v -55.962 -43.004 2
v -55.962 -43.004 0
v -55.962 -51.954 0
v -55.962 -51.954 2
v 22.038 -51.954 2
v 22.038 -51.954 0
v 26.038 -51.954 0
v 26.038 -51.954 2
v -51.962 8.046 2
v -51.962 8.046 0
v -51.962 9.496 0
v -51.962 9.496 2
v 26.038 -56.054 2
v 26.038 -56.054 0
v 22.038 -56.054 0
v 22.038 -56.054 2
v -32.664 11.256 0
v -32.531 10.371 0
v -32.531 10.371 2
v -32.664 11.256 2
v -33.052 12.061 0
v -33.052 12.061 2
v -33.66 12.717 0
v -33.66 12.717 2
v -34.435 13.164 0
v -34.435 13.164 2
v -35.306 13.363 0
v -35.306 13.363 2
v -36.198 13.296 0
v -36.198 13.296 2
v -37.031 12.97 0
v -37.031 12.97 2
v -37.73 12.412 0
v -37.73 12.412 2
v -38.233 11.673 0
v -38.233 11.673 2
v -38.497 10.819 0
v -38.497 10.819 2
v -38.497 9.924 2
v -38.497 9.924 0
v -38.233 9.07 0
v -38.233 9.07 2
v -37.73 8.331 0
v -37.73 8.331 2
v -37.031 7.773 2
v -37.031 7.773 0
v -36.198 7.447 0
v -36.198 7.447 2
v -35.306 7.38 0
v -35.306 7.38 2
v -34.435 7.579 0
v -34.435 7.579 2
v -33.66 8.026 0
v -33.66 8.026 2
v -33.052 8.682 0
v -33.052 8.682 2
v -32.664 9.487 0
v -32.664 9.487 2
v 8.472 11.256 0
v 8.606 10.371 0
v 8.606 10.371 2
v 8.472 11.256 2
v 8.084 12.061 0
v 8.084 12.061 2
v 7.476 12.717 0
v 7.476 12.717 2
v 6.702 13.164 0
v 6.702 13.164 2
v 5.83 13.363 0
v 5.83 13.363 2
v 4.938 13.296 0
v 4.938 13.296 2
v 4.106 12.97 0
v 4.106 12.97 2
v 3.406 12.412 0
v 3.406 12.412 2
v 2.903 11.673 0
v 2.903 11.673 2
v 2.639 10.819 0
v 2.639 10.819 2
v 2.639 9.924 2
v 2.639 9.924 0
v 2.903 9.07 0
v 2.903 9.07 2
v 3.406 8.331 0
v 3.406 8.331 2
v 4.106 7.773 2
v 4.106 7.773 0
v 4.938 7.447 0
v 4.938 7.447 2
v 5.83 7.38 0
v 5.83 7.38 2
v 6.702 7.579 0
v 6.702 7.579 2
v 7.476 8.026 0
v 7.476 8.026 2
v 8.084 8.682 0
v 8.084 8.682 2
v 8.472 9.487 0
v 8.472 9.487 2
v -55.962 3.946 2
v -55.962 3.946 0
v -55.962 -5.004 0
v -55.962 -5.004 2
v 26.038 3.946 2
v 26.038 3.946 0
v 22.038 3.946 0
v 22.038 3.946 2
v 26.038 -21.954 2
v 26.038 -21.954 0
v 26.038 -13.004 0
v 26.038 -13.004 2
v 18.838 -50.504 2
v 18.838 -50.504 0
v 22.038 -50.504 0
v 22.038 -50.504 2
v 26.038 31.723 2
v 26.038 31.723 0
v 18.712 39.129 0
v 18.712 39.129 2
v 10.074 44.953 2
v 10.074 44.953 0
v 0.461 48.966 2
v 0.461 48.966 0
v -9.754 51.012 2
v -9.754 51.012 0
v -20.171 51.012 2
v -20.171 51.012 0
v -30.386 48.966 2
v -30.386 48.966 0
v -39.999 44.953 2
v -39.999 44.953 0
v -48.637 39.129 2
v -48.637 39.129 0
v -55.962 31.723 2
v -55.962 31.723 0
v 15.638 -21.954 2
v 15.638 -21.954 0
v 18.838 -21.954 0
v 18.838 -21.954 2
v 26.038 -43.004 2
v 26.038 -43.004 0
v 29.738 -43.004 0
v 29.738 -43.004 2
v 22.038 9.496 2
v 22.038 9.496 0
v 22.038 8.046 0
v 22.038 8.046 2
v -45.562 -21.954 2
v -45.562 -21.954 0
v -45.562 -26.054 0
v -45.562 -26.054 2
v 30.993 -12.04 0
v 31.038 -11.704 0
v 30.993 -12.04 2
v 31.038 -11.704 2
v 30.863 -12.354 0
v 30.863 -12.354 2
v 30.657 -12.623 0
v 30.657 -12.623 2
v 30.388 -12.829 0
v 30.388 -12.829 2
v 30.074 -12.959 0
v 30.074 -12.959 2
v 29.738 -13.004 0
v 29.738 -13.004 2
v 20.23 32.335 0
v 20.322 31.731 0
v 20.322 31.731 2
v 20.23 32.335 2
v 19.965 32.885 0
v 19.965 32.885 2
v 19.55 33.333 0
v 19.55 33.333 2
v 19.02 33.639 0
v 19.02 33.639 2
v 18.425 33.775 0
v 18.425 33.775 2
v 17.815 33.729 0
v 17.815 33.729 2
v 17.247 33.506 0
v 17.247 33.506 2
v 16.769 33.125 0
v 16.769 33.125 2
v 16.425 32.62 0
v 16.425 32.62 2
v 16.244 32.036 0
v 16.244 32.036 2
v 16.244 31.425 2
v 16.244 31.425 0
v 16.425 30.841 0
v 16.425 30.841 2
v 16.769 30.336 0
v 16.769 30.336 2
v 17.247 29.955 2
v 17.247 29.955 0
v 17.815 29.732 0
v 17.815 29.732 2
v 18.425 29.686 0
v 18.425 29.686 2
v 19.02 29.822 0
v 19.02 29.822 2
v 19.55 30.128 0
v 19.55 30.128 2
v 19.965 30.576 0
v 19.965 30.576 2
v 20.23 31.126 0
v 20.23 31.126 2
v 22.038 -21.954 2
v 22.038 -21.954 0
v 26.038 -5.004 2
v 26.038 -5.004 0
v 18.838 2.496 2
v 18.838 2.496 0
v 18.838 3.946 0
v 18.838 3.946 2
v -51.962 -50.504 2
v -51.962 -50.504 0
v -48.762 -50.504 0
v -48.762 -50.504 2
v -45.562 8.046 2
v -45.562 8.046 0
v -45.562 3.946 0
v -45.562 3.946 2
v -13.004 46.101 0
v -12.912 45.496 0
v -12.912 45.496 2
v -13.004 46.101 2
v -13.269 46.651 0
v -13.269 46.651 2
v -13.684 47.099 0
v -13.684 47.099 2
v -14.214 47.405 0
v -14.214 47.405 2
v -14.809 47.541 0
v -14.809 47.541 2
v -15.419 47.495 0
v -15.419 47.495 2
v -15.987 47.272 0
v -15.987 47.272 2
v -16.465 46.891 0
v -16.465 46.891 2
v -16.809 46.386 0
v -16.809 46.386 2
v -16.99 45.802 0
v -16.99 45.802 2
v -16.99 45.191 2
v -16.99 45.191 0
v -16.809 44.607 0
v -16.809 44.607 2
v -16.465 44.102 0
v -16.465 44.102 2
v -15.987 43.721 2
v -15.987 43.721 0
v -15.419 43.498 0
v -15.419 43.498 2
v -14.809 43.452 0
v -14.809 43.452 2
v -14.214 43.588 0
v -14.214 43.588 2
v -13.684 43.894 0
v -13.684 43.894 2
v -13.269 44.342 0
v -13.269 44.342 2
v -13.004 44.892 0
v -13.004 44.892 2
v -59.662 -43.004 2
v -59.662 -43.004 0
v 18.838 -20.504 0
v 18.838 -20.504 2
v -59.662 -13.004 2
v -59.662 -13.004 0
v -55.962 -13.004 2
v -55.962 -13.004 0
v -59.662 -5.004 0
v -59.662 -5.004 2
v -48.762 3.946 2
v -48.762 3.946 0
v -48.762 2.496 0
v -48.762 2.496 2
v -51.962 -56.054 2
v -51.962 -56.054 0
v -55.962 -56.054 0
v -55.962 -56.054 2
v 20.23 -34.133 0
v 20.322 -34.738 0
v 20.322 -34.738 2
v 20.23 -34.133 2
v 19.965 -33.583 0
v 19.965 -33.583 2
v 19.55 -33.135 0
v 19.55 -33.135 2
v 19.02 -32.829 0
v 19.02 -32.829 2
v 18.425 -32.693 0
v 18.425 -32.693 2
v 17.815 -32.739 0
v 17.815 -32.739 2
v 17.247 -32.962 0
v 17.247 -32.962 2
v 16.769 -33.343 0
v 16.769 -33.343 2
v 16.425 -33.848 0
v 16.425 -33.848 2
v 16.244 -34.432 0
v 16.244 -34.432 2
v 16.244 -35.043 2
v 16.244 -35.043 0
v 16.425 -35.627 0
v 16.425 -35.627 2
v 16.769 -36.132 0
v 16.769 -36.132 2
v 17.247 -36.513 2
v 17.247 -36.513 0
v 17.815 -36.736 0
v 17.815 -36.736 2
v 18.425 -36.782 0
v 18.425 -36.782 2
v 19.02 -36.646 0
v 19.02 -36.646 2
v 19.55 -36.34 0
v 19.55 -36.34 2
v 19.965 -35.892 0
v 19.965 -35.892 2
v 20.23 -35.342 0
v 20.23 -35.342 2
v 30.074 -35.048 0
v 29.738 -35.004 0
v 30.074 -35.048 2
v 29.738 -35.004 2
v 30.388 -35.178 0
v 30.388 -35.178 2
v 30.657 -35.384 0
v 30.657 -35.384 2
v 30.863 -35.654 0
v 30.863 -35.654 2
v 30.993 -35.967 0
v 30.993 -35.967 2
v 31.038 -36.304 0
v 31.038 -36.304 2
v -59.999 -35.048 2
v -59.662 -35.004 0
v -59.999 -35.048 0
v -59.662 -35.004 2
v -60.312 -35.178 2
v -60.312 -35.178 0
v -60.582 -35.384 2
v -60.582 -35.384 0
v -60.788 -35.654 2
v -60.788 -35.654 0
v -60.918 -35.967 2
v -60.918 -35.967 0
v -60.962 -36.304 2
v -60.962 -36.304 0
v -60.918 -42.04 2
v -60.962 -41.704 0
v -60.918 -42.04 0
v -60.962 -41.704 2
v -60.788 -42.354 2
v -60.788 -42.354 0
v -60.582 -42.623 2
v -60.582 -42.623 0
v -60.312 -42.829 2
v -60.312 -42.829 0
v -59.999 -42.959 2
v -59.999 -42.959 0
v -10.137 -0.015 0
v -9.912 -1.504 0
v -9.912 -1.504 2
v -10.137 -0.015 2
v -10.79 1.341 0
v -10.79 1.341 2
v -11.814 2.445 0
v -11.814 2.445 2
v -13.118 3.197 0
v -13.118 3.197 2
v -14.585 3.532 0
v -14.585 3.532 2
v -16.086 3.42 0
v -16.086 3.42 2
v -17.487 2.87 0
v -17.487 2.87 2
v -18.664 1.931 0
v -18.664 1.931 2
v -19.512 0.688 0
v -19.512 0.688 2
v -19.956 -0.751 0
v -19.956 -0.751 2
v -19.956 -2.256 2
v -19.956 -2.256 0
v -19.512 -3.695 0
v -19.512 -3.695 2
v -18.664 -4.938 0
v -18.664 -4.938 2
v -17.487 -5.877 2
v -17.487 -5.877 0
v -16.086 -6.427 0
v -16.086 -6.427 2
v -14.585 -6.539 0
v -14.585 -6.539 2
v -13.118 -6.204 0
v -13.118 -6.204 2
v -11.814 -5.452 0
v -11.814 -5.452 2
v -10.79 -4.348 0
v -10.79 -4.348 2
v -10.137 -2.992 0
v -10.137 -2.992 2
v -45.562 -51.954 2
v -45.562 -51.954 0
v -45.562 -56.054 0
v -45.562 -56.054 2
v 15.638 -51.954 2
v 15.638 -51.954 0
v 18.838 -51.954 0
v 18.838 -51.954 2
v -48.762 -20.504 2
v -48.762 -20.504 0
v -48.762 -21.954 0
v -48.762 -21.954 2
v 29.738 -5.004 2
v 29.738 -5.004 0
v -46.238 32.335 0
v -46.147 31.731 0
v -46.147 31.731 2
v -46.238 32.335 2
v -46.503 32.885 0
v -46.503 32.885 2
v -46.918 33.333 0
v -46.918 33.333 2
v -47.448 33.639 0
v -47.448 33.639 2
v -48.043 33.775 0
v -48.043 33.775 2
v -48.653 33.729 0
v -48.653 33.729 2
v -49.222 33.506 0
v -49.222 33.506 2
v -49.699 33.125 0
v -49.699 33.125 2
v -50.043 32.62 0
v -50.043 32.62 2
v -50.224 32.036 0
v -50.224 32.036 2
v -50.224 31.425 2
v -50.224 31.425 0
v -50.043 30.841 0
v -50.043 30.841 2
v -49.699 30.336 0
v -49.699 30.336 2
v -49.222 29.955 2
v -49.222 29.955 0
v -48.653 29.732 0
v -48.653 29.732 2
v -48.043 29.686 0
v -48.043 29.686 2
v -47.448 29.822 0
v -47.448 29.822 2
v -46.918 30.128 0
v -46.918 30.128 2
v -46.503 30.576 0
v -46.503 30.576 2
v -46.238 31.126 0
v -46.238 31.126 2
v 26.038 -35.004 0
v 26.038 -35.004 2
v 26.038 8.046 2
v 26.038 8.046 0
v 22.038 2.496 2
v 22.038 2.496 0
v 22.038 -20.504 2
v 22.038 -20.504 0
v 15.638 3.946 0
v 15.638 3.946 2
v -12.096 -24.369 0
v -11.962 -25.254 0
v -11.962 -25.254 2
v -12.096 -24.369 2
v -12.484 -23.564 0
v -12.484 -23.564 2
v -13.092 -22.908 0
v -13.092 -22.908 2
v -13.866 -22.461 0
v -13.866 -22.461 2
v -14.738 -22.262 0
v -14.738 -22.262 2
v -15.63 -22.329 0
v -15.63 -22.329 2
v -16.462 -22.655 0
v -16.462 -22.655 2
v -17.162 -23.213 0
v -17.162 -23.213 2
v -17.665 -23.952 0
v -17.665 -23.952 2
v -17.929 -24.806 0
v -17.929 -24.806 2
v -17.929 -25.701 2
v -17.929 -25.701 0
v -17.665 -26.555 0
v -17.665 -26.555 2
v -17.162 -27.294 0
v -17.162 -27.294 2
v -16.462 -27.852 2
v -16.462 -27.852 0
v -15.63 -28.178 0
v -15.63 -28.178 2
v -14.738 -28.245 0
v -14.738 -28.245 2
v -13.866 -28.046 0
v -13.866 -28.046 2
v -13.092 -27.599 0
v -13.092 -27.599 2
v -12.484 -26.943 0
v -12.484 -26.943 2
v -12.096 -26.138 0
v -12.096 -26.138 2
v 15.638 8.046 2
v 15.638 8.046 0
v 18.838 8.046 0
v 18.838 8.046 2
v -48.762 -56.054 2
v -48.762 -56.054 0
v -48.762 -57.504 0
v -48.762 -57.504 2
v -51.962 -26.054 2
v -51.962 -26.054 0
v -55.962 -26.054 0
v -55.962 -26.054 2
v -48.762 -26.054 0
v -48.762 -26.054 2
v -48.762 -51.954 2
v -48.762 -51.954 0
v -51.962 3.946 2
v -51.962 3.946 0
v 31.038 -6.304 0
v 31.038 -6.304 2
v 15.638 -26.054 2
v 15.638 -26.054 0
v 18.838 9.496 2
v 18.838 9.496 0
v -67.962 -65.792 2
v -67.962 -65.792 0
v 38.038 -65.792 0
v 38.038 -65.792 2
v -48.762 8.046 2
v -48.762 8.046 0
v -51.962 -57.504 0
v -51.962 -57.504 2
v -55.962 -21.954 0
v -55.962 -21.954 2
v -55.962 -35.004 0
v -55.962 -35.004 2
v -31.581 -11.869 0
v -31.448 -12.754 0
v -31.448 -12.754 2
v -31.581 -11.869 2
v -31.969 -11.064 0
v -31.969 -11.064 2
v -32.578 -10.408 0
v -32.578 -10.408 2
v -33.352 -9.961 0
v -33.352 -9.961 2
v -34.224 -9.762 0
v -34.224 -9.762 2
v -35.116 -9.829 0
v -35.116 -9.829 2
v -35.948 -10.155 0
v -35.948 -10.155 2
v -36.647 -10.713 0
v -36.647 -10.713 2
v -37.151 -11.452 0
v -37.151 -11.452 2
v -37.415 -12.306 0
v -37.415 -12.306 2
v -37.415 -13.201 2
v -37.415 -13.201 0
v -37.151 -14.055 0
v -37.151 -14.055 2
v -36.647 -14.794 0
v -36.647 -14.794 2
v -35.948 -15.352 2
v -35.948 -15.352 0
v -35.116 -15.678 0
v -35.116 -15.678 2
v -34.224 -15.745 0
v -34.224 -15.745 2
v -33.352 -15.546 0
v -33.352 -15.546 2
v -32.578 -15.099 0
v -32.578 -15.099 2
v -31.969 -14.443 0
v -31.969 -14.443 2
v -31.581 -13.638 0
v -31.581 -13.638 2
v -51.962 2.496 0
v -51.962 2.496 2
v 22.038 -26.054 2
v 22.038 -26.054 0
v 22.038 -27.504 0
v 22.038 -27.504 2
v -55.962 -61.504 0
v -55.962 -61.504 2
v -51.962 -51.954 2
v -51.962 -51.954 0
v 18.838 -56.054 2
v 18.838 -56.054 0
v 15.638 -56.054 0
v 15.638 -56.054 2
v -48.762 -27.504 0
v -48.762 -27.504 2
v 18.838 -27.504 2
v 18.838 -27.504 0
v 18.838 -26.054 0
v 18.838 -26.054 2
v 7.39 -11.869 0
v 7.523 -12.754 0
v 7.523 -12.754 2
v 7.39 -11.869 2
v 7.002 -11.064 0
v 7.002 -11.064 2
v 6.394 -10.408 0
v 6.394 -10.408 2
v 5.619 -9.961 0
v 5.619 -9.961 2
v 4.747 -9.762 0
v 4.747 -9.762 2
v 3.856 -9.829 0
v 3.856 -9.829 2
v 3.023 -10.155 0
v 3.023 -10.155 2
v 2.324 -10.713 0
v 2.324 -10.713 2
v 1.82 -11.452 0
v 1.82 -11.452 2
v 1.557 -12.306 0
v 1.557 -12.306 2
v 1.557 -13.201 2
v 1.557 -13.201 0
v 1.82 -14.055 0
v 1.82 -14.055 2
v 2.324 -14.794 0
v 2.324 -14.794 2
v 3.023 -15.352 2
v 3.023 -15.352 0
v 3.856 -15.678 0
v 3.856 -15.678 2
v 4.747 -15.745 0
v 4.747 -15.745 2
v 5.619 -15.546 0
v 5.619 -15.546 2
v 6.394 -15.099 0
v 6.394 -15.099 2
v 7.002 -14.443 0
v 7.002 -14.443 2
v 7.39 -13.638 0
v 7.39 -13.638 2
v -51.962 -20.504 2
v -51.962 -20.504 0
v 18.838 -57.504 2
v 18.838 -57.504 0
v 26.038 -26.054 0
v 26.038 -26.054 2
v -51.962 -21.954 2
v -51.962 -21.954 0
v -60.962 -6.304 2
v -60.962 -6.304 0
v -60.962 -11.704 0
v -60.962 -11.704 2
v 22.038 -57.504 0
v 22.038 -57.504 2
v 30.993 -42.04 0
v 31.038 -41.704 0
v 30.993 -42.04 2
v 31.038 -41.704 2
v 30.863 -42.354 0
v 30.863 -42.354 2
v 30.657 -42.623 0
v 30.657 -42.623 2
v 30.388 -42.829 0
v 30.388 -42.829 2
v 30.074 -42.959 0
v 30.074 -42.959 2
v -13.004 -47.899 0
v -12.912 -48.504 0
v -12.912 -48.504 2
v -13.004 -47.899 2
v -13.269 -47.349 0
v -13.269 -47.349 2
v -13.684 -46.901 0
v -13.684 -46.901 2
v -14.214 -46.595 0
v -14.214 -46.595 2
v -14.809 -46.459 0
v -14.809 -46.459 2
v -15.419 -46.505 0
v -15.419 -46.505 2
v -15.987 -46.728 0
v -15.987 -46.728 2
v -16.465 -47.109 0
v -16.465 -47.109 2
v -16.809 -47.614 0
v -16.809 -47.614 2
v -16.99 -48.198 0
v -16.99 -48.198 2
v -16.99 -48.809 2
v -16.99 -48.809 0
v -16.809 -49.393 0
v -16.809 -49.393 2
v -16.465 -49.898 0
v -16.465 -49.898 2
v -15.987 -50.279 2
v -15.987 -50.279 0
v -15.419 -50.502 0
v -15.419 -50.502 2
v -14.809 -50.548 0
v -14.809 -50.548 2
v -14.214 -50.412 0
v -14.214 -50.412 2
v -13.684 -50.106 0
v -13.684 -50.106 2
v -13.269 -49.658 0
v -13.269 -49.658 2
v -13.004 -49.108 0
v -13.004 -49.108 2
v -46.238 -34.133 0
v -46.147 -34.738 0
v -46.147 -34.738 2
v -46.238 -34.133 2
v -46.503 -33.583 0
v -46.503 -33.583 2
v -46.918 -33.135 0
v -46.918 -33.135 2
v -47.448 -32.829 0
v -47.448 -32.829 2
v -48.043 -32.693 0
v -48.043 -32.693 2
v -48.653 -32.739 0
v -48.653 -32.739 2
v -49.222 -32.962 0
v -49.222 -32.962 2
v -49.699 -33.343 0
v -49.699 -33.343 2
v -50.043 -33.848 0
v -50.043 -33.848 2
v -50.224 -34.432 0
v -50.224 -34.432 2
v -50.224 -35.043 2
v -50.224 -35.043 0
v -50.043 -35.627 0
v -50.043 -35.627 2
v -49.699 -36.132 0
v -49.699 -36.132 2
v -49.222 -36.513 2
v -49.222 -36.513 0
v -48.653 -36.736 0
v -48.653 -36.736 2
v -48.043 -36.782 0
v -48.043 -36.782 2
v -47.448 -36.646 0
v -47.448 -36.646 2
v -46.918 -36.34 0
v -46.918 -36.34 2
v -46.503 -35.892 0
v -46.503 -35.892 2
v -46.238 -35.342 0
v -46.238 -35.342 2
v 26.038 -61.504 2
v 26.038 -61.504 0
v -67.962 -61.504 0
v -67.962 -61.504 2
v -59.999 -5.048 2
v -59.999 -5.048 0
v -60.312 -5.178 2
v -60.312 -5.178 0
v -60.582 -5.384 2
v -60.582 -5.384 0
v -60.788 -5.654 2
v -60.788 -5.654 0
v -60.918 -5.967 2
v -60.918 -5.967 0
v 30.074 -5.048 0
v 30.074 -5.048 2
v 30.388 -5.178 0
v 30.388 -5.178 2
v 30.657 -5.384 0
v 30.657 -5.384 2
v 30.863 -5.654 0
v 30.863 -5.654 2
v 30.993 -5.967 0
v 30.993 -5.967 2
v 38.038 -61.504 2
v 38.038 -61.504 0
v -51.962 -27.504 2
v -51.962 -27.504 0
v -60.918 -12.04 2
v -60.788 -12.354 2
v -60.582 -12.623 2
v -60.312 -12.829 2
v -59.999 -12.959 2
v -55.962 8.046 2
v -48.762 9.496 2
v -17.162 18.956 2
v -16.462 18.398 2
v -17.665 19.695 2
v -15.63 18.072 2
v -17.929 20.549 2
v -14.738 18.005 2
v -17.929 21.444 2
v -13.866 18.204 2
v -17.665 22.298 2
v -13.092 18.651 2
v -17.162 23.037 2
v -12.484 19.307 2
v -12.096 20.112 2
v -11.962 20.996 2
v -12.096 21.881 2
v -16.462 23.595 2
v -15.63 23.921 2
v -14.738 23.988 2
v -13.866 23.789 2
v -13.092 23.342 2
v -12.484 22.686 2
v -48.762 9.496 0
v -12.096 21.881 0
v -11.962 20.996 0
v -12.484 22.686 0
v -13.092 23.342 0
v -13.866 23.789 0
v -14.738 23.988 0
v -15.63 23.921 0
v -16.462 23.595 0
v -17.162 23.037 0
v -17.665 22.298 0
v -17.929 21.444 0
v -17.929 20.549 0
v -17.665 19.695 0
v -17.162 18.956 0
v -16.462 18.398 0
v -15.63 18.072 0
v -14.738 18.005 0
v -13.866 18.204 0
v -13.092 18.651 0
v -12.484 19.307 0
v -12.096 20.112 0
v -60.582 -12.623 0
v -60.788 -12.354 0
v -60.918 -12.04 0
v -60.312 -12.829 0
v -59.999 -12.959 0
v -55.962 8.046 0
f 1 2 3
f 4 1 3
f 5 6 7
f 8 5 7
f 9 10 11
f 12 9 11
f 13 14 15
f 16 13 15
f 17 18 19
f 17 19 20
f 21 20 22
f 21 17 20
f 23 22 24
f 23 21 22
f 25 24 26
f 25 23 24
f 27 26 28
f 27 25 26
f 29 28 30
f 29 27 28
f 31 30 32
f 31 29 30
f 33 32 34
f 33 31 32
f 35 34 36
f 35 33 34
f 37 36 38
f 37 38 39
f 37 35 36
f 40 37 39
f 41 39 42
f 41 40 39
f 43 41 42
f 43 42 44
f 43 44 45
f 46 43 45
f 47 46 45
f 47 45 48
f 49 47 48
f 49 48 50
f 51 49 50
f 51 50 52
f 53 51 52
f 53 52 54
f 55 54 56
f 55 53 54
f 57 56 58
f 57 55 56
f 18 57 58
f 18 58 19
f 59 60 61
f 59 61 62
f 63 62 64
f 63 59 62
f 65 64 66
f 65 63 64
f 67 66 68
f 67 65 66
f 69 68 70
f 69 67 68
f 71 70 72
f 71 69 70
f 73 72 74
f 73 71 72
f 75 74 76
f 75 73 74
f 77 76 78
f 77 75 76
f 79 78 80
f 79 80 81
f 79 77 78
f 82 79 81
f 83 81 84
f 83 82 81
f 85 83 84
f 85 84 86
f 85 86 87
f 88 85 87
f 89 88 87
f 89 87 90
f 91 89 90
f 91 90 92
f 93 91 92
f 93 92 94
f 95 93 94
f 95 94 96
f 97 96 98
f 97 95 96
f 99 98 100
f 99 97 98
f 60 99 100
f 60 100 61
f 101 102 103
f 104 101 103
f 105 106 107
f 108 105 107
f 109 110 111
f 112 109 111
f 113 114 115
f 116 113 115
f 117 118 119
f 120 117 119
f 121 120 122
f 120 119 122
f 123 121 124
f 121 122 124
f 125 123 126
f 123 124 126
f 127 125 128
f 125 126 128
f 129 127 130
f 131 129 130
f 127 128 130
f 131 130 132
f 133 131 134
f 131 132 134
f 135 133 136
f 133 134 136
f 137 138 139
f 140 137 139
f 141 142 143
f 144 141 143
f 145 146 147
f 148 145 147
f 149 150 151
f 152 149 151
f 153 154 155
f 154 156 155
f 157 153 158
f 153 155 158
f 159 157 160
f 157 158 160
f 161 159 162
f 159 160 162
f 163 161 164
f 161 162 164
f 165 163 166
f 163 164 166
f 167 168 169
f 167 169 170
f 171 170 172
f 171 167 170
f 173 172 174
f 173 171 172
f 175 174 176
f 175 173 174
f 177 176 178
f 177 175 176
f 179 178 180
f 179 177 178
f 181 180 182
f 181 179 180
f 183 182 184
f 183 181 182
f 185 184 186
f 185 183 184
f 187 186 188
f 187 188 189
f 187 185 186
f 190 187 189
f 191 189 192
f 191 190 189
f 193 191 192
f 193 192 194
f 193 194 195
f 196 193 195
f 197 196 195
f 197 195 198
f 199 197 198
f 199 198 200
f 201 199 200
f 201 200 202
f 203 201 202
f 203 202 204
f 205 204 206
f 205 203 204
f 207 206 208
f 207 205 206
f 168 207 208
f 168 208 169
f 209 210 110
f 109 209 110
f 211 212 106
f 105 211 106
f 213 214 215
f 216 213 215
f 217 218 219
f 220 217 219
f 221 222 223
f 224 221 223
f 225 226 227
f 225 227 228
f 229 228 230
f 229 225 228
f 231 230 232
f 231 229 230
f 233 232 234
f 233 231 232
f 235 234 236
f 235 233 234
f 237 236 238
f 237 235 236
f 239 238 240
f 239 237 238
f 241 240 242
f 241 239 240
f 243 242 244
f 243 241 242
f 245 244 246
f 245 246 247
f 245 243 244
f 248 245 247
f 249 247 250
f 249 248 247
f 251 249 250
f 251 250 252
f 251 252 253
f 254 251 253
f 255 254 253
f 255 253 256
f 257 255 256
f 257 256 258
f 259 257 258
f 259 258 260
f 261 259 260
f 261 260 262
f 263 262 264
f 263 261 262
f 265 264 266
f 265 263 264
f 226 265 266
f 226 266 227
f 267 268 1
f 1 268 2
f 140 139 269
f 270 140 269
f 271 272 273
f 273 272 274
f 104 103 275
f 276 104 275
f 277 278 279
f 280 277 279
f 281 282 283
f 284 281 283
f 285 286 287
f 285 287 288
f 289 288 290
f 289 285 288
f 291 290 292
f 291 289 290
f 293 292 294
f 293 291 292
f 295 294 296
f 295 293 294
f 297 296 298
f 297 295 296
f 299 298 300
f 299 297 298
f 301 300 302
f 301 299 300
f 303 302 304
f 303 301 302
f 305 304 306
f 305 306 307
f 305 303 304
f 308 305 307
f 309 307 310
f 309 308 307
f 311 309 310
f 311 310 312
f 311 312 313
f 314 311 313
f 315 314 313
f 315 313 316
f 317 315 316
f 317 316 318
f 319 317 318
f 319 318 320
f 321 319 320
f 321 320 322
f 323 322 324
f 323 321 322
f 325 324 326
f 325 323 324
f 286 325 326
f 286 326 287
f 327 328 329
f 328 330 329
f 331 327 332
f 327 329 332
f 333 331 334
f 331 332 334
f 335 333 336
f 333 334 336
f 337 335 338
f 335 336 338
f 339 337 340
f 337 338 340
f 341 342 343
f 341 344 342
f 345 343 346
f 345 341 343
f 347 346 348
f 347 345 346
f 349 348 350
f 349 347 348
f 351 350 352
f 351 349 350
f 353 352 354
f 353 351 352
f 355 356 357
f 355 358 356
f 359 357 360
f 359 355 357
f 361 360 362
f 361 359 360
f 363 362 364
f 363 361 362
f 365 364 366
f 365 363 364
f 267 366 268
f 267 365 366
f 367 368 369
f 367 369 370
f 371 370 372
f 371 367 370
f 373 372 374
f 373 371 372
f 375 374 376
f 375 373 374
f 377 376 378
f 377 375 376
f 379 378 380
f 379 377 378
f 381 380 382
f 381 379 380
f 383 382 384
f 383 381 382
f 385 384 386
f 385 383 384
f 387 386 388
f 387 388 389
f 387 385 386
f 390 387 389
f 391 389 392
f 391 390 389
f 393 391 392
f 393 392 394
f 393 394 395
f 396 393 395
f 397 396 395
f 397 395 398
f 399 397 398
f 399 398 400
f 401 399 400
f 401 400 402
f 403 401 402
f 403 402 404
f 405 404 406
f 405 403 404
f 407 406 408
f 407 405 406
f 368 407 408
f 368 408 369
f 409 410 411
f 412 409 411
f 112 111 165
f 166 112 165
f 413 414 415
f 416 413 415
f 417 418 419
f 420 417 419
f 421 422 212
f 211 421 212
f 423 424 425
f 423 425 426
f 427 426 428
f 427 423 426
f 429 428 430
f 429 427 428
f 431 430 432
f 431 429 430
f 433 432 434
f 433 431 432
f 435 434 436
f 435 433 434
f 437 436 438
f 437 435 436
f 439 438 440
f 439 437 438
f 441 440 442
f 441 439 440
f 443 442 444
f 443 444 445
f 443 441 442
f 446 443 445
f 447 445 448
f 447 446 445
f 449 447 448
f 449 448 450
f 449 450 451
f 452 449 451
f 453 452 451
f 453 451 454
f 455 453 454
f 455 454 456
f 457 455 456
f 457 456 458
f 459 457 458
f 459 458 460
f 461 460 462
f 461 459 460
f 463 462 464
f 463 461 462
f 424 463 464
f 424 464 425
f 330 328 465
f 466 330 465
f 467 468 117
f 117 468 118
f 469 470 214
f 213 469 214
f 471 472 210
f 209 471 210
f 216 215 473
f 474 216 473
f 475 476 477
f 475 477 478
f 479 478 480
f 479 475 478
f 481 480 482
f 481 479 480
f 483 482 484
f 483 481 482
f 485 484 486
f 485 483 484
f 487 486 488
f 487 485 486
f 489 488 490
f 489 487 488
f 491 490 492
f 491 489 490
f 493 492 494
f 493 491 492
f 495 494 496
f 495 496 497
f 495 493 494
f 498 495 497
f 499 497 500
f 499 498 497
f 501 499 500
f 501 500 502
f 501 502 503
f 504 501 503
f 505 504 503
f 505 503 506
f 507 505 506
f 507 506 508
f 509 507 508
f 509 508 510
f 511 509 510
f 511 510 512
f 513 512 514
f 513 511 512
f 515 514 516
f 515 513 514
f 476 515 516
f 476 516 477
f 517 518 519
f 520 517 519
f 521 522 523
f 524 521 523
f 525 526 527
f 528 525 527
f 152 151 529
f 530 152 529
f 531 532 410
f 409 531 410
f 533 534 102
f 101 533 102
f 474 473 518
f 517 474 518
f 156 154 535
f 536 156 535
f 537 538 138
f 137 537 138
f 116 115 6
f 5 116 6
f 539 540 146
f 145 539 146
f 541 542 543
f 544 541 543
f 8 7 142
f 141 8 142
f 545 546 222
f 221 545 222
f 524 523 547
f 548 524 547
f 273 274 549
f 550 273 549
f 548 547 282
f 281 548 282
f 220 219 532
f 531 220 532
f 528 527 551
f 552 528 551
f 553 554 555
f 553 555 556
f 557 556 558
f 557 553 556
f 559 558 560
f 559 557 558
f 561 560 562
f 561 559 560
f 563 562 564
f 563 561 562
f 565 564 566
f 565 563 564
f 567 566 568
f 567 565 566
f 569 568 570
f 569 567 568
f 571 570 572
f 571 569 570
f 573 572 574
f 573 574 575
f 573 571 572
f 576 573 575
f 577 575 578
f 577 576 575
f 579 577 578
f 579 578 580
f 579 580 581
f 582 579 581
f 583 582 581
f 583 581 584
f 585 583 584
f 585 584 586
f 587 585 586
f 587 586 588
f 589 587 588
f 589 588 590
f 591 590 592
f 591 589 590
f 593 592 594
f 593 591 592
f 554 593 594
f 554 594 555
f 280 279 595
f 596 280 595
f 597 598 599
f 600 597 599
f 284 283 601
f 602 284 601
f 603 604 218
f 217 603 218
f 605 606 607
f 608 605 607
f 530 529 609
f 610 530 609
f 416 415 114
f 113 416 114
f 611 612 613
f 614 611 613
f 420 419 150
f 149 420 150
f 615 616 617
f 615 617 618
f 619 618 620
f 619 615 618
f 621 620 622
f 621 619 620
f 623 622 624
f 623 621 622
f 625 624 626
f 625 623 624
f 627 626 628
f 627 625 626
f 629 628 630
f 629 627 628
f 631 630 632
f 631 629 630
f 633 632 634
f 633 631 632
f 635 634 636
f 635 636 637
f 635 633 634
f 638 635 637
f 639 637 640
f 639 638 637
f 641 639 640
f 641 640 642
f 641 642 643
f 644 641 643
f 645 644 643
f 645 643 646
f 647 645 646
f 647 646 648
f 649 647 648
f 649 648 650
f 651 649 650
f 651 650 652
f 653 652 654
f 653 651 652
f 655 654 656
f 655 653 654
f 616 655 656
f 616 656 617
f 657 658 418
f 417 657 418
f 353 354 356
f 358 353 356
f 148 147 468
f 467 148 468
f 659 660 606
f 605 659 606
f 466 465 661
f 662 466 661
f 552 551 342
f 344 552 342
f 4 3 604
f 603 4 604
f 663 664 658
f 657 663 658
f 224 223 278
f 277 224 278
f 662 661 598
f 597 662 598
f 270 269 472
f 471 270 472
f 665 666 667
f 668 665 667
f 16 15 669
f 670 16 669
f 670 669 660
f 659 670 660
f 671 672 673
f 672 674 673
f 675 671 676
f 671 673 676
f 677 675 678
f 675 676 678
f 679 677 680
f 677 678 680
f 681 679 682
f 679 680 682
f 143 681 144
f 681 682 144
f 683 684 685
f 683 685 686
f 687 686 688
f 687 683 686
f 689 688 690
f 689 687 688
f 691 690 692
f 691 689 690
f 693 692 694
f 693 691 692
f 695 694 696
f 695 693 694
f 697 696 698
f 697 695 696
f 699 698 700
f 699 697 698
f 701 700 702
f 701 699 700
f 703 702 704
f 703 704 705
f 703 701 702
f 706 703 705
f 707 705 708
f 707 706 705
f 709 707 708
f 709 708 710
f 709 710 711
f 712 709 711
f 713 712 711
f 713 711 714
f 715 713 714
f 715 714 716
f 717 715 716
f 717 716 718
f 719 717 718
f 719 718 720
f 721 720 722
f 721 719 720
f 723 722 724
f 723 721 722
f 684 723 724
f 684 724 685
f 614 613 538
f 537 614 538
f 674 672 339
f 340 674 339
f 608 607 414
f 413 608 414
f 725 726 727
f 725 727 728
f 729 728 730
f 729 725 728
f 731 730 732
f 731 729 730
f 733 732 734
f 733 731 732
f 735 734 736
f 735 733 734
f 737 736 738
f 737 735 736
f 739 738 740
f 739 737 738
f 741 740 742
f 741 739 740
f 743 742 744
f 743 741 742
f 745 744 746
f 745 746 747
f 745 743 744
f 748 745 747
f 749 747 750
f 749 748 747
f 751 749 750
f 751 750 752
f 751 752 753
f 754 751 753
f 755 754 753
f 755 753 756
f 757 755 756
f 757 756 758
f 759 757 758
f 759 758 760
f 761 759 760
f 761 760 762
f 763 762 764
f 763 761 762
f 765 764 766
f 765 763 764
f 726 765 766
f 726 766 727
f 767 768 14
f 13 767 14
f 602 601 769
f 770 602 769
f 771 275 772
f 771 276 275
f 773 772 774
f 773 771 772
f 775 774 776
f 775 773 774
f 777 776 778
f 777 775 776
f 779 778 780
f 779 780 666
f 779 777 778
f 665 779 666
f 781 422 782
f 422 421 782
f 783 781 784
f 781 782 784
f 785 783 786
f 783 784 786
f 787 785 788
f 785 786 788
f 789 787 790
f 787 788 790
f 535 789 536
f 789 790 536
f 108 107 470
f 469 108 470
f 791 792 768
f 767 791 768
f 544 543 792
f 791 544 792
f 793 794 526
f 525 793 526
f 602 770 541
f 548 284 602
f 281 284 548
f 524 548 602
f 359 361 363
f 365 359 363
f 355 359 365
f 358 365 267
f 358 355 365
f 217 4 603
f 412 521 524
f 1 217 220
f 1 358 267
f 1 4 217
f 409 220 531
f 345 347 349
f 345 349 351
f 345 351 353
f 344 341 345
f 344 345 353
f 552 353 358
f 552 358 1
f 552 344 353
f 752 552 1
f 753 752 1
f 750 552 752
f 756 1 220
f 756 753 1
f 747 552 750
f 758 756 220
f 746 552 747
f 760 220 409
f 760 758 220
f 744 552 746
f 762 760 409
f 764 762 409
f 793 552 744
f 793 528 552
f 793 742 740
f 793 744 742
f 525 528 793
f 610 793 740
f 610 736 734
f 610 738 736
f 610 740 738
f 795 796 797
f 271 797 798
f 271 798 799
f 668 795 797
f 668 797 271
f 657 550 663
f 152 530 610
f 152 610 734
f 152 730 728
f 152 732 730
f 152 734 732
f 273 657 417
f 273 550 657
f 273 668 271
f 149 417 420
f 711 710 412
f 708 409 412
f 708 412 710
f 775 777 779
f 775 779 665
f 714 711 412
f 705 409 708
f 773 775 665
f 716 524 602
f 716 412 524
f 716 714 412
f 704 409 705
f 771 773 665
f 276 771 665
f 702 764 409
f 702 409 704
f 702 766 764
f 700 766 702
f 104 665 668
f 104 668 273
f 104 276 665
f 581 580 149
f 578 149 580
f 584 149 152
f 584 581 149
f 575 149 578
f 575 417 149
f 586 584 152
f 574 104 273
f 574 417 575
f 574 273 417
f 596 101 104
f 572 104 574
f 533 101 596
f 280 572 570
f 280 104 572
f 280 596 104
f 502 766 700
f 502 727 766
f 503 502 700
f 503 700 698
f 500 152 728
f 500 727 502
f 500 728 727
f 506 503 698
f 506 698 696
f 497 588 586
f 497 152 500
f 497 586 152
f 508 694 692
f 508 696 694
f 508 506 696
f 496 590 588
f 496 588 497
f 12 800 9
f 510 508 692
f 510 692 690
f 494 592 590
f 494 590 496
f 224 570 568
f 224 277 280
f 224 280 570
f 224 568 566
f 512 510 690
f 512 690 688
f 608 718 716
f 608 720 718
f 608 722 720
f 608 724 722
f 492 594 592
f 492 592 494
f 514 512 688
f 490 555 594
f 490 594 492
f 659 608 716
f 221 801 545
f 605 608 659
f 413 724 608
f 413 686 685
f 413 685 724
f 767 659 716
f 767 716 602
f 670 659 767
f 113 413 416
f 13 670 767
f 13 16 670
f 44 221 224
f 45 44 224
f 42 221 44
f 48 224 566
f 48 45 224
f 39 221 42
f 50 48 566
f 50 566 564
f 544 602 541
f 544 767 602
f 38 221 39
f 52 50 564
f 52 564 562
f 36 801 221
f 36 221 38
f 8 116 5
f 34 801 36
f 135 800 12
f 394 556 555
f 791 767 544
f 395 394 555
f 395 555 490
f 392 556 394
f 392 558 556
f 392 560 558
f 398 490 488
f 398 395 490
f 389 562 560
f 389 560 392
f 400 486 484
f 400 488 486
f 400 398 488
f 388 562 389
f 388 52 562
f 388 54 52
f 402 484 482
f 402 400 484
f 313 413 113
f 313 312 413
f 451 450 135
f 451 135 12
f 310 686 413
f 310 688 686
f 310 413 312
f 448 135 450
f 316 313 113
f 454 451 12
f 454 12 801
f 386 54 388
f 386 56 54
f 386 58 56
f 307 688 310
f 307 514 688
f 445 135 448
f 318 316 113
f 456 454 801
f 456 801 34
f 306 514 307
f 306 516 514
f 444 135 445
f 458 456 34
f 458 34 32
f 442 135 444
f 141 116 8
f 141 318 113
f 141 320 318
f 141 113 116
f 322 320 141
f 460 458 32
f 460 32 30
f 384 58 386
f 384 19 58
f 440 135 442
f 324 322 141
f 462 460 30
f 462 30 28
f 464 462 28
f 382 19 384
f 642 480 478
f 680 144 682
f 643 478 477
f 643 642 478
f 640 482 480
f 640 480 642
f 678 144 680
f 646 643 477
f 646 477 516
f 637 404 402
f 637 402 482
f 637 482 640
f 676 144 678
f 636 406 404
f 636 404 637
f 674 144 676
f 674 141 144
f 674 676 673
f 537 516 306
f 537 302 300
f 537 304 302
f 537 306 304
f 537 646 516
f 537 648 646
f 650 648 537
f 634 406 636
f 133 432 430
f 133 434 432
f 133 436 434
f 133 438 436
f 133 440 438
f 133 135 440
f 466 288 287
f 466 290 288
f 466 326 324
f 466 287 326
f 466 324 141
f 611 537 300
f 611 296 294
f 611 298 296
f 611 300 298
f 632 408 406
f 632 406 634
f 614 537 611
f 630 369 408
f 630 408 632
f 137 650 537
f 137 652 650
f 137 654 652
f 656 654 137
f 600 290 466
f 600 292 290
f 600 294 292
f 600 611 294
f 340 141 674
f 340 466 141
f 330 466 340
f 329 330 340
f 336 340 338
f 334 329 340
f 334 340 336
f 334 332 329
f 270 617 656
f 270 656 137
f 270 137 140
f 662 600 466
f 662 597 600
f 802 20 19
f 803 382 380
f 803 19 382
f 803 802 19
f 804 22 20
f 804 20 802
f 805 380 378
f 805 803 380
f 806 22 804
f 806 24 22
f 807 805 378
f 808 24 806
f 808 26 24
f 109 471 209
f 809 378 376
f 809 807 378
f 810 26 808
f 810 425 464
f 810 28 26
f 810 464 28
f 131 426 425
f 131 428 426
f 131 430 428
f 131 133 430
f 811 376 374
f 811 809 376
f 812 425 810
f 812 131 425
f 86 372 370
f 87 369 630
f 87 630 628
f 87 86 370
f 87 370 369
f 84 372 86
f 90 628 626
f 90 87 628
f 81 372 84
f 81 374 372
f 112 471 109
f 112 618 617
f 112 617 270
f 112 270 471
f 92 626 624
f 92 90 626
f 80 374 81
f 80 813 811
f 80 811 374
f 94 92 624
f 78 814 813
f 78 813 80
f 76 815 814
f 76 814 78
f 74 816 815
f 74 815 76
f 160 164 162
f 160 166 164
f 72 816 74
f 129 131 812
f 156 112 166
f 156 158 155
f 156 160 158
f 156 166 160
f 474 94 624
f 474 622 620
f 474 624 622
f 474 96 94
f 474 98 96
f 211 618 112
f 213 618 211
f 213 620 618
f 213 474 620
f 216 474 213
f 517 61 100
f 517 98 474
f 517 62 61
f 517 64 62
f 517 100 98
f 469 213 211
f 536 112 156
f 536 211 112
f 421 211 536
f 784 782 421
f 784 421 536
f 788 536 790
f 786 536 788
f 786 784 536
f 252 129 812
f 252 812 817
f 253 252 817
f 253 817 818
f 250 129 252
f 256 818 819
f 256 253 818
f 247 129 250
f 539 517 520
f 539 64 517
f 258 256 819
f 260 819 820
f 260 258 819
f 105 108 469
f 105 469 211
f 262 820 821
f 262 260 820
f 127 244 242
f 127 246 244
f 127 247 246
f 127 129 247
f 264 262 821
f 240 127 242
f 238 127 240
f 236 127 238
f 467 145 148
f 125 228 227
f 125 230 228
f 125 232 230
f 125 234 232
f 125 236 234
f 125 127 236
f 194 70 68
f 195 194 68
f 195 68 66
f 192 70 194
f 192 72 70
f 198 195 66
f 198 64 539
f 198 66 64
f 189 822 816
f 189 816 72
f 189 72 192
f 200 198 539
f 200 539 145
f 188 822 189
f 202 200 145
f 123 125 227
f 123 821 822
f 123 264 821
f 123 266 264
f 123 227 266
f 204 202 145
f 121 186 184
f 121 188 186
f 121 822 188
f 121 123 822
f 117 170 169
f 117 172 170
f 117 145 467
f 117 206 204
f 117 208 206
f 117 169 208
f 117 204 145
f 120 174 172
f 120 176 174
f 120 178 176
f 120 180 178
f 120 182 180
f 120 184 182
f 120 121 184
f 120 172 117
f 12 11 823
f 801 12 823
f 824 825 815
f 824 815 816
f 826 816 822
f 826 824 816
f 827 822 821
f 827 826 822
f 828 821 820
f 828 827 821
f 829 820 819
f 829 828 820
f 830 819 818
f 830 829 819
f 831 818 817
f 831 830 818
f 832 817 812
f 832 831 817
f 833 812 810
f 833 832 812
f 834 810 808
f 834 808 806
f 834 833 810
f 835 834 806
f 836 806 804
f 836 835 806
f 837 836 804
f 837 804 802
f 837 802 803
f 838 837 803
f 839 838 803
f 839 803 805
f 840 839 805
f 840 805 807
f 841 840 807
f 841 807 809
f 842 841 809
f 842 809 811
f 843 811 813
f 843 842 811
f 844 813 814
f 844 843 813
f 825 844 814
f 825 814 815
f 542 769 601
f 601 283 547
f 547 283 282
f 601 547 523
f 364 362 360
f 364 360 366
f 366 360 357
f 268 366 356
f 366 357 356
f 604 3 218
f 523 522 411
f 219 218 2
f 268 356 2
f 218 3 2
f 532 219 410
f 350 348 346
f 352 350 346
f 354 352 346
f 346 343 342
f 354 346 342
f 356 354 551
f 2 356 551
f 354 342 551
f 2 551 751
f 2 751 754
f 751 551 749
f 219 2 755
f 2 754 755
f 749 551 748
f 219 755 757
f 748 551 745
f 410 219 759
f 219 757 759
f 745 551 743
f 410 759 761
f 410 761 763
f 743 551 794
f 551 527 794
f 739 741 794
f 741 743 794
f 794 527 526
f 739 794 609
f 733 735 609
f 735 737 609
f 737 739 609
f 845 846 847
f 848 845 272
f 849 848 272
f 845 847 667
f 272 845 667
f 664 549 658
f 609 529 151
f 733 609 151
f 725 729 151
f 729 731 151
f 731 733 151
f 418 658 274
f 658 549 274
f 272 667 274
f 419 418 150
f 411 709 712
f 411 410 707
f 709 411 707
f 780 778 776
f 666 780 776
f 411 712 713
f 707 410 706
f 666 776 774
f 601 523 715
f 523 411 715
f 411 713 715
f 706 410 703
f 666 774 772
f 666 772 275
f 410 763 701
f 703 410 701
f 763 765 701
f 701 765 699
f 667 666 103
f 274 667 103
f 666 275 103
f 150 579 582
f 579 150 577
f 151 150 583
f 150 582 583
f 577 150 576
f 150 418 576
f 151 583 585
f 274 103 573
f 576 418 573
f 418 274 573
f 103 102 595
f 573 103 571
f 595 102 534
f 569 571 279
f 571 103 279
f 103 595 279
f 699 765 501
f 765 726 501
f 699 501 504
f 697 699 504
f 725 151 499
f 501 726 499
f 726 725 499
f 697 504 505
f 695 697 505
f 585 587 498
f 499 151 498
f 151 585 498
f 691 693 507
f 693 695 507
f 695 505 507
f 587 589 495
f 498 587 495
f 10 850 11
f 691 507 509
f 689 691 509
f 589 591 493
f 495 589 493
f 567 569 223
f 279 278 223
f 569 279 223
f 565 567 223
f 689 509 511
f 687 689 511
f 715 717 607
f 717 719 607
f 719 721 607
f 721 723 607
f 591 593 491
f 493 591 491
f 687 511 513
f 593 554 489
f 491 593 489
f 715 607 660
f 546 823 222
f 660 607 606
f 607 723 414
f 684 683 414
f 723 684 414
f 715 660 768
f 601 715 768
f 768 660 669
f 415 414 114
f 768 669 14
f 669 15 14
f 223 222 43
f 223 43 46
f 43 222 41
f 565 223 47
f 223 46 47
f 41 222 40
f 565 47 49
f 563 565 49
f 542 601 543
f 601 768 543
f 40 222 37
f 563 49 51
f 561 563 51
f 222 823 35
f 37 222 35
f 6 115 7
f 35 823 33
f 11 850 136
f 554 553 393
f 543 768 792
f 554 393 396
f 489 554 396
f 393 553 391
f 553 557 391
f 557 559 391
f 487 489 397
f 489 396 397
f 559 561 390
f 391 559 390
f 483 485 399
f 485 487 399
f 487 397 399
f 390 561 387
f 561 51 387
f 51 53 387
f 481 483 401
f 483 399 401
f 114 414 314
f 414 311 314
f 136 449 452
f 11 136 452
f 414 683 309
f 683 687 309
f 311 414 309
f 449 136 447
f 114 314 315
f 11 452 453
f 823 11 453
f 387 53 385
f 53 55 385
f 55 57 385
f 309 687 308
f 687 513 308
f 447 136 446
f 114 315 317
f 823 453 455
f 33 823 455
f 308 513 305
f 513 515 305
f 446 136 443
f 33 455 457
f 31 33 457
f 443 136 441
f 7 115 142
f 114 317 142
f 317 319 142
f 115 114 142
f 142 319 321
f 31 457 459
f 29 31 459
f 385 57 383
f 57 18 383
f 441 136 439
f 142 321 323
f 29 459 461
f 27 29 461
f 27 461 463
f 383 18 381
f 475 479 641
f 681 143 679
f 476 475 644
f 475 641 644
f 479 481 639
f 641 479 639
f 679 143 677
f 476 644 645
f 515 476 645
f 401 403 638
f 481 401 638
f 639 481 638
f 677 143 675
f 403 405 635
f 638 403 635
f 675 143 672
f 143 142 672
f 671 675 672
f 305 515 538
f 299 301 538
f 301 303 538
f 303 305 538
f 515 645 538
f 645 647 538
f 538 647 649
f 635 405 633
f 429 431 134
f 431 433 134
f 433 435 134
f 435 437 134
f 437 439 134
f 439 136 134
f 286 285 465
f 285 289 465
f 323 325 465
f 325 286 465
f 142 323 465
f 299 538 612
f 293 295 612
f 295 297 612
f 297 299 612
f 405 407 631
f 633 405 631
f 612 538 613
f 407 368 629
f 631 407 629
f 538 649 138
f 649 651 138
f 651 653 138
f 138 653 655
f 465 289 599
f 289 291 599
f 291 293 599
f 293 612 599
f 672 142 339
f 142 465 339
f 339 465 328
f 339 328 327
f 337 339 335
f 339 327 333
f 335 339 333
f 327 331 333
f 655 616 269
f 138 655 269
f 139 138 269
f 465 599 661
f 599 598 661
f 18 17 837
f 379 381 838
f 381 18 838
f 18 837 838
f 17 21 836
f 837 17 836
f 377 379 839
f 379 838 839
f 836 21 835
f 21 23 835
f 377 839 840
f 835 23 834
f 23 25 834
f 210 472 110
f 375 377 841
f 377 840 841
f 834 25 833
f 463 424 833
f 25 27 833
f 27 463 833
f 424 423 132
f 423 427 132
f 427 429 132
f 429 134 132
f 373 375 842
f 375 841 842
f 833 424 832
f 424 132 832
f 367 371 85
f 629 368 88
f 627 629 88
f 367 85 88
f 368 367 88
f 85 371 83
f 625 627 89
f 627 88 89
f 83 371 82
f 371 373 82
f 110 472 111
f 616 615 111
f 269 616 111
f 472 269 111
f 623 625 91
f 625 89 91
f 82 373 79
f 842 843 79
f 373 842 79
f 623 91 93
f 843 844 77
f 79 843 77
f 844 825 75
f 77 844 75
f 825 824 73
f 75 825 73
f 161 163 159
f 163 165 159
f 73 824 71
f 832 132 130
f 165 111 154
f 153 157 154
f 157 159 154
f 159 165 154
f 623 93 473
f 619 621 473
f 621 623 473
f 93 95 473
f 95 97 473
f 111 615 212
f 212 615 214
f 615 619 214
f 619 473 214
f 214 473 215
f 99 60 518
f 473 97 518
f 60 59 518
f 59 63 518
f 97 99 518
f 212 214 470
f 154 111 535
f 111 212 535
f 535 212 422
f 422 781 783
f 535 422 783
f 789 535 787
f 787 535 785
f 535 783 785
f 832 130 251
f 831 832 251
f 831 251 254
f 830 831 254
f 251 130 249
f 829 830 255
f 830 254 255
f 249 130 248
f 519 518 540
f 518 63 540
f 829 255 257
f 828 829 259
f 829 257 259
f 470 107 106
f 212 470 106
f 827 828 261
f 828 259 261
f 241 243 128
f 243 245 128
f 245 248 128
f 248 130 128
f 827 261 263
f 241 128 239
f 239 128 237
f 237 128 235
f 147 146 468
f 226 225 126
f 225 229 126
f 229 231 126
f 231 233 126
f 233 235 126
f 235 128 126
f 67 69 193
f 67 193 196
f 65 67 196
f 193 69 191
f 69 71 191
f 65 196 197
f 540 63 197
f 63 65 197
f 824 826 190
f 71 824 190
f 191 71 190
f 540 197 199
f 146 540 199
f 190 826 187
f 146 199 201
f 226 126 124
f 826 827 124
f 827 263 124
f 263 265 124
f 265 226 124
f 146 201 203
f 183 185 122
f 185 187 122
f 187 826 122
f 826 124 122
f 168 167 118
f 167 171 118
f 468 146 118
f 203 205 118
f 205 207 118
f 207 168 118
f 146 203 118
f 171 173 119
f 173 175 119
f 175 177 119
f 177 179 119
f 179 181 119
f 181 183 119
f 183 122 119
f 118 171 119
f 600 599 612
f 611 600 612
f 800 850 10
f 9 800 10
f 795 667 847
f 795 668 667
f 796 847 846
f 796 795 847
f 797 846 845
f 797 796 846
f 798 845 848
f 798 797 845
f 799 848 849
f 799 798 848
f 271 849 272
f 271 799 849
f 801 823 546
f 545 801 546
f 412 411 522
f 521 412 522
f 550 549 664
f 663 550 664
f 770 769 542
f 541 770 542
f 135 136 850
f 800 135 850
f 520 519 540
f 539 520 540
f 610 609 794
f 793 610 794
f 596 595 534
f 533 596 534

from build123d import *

# Parameters (mm, degrees)
SKETCH_1_R      = 3
SKETCH_1_R_2    = 5.05
SKETCH_1_R_3    = 2.05
EXTRUDE_2_DEPTH = 2
FILLET_1_R      = 1.3


with BuildPart() as part:
    # 草图1 → 凸台-拉伸2 (new body)
    with BuildSketch(Plane.XY):
        with BuildLine():
            Line((-55.962487977, 23.496493589), (-55.962487977, 8.046493589))
            Line((-55.962487977, 8.046493589), (-51.962487977, 8.046493589))
            Line((-51.962487977, 8.046493589), (-51.962487977, 9.496493589))
            Line((-51.962487977, 9.496493589), (-48.762487977, 9.496493589))
            Line((-48.762487977, 9.496493589), (-48.762487977, 8.046493589))
            Line((-48.762487977, 8.046493589), (-45.562487977, 8.046493589))
            Line((-45.562487977, 8.046493589), (-45.562487977, 3.946493589))
            Line((-45.562487977, 3.946493589), (-48.762487977, 3.946493589))
            Line((-48.762487977, 3.946493589), (-48.762487977, 2.496493589))
            Line((-48.762487977, 2.496493589), (-51.962487977, 2.496493589))
            Line((-51.962487977, 2.496493589), (-51.962487977, 3.946493589))
            Line((-51.962487977, 3.946493589), (-55.962487977, 3.946493589))
            Line((-55.962487977, 3.946493589), (-55.962487977, -5.003506411))
            Line((-55.962487977, -5.003506411), (-60.962487977, -5.003506411))
            Line((-60.962487977, -5.003506411), (-60.962487977, -13.003506411))
            Line((-60.962487977, -13.003506411), (-55.962487977, -13.003506411))
            Line((-55.962487977, -13.003506411), (-55.962487977, -21.953506411))
            Line((-55.962487977, -21.953506411), (-51.962487977, -21.953506411))
            Line((-51.962487977, -21.953506411), (-51.962487977, -20.503506411))
            Line((-51.962487977, -20.503506411), (-48.762487977, -20.503506411))
            Line((-48.762487977, -20.503506411), (-48.762487977, -21.953506411))
            Line((-48.762487977, -21.953506411), (-45.562487977, -21.953506411))
            Line((-45.562487977, -21.953506411), (-45.562487977, -26.053506411))
            Line((-45.562487977, -26.053506411), (-48.762487977, -26.053506411))
            Line((-48.762487977, -26.053506411), (-48.762487977, -27.503506411))
            Line((-48.762487977, -27.503506411), (-51.962487977, -27.503506411))
            Line((-51.962487977, -27.503506411), (-51.962487977, -26.053506411))
            Line((-51.962487977, -26.053506411), (-55.962487977, -26.053506411))
            Line((-55.962487977, -26.053506411), (-55.962487977, -35.003506411))
            Line((-55.962487977, -35.003506411), (-60.962487977, -35.003506411))
            Line((-60.962487977, -35.003506411), (-60.962487977, -43.003506411))
            Line((-60.962487977, -43.003506411), (-55.962487977, -43.003506411))
            Line((-55.962487977, -43.003506411), (-55.962487977, -51.953506411))
            Line((-55.962487977, -51.953506411), (-51.962487977, -51.953506411))
            Line((-51.962487977, -51.953506411), (-51.962487977, -50.503506411))
            Line((-51.962487977, -50.503506411), (-48.762487977, -50.503506411))
            Line((-48.762487977, -50.503506411), (-48.762487977, -51.953506411))
            Line((-48.762487977, -51.953506411), (-45.562487977, -51.953506411))
            Line((-45.562487977, -51.953506411), (-45.562487977, -56.053506411))
            Line((-45.562487977, -56.053506411), (-48.762487977, -56.053506411))
            Line((-48.762487977, -56.053506411), (-48.762487977, -57.503506411))
            Line((-48.762487977, -57.503506411), (-51.962487977, -57.503506411))
            Line((-51.962487977, -57.503506411), (-51.962487977, -56.053506411))
            Line((-51.962487977, -56.053506411), (-55.962487977, -56.053506411))
            Line((-55.962487977, -56.053506411), (-55.962487977, -61.503506411))
            Line((-55.962487977, -61.503506411), (-67.962487977, -61.503506411))
            Line((-67.962487977, -61.503506411), (-67.962487977, -65.791888255))
            Line((-67.962487977, -65.791888255), (38.037512023, -65.791888255))
            Line((38.037512023, -65.791888255), (38.037512023, -61.503506411))
            Line((38.037512023, -61.503506411), (26.037512023, -61.503506411))
            Line((26.037512023, -61.503506411), (26.037512023, -56.053506411))
            Line((26.037512023, -56.053506411), (22.037512023, -56.053506411))
            Line((22.037512023, -56.053506411), (22.037512023, -57.503506411))
            Line((22.037512023, -57.503506411), (18.837512023, -57.503506411))
            Line((18.837512023, -57.503506411), (18.837512023, -56.053506411))
            Line((18.837512023, -56.053506411), (15.637512023, -56.053506411))
            Line((15.637512023, -56.053506411), (15.637512023, -51.953506411))
            Line((15.637512023, -51.953506411), (18.837512023, -51.953506411))
            Line((18.837512023, -51.953506411), (18.837512023, -50.503506411))
            Line((18.837512023, -50.503506411), (22.037512023, -50.503506411))
            Line((22.037512023, -50.503506411), (22.037512023, -51.953506411))
            Line((22.037512023, -51.953506411), (26.037512023, -51.953506411))
            Line((26.037512023, -51.953506411), (26.037512023, -43.003506411))
            Line((26.037512023, -43.003506411), (31.037512023, -43.003506411))
            Line((31.037512023, -43.003506411), (31.037512023, -35.003506411))
            Line((31.037512023, -35.003506411), (26.037512023, -35.003506411))
            Line((26.037512023, -35.003506411), (26.037512023, -26.053506411))
            Line((26.037512023, -26.053506411), (22.037512023, -26.053506411))
            Line((22.037512023, -26.053506411), (22.037512023, -27.503506411))
            Line((22.037512023, -27.503506411), (18.837512023, -27.503506411))
            Line((18.837512023, -27.503506411), (18.837512023, -26.053506411))
            Line((18.837512023, -26.053506411), (15.637512023, -26.053506411))
            Line((15.637512023, -26.053506411), (15.637512023, -21.953506411))
            Line((15.637512023, -21.953506411), (18.837512023, -21.953506411))
            Line((18.837512023, -21.953506411), (18.837512023, -20.503506411))
            Line((18.837512023, -20.503506411), (22.037512023, -20.503506411))
            Line((22.037512023, -20.503506411), (22.037512023, -21.953506411))
            Line((22.037512023, -21.953506411), (26.037512023, -21.953506411))
            Line((26.037512023, -21.953506411), (26.037512023, -13.003506411))
            Line((26.037512023, -13.003506411), (31.037512023, -13.003506411))
            Line((31.037512023, -13.003506411), (31.037512023, -5.003506411))
            Line((31.037512023, -5.003506411), (26.037512023, -5.003506411))
            Line((26.037512023, -5.003506411), (26.037512023, 3.946493589))
            Line((26.037512023, 3.946493589), (22.037512023, 3.946493589))
            Line((22.037512023, 3.946493589), (22.037512023, 2.496493589))
            Line((22.037512023, 2.496493589), (18.837512023, 2.496493589))
            Line((18.837512023, 2.496493589), (18.837512023, 3.946493589))
            Line((18.837512023, 3.946493589), (15.637512023, 3.946493589))
            Line((15.637512023, 3.946493589), (15.637512023, 8.046493589))
            Line((15.637512023, 8.046493589), (18.837512023, 8.046493589))
            Line((18.837512023, 8.046493589), (18.837512023, 9.496493589))
            Line((18.837512023, 9.496493589), (22.037512023, 9.496493589))
            Line((22.037512023, 9.496493589), (22.037512023, 8.046493589))
            Line((22.037512023, 8.046493589), (26.037512023, 8.046493589))
            Line((26.037512023, 8.046493589), (26.037512023, 23.496493589))
            Line((26.037512023, 23.496493589), (26.037512023, 31.722989041))
            ThreePointArc((26.037512023, 31.722989041), (-14.962487977, 51.269592797), (-55.962487977, 31.722989041))
            Line((-55.962487977, 31.722989041), (-55.962487977, 23.496493589))
        make_face()
        with Locations((-14.962487977, -25.253506411)):
            Circle(SKETCH_1_R, mode=Mode.SUBTRACT)
        with Locations((4.523083608, -12.753506411)):
            Circle(SKETCH_1_R, mode=Mode.SUBTRACT)
        with Locations((-14.962487977, -1.503506411)):
            Circle(SKETCH_1_R_2, mode=Mode.SUBTRACT)
        with Locations((-35.530591317, 10.371493589)):
            Circle(SKETCH_1_R, mode=Mode.SUBTRACT)
        with Locations((-34.448059562, -12.753506411)):
            Circle(SKETCH_1_R, mode=Mode.SUBTRACT)
        with Locations((5.605615363, 10.371493589)):
            Circle(SKETCH_1_R, mode=Mode.SUBTRACT)
        with Locations((-14.962487977, 20.996493589)):
            Circle(SKETCH_1_R, mode=Mode.SUBTRACT)
        with Locations((18.271530739, -34.737525127)):
            Circle(SKETCH_1_R_3, mode=Mode.SUBTRACT)
        with Locations((-14.962487977, -48.503506411)):
            Circle(SKETCH_1_R_3, mode=Mode.SUBTRACT)
        with Locations((-48.196506692, -34.737525127)):
            Circle(SKETCH_1_R_3, mode=Mode.SUBTRACT)
        with Locations((-48.196506692, 31.730512305)):
            Circle(SKETCH_1_R_3, mode=Mode.SUBTRACT)
        with Locations((-14.962487977, 45.496493589)):
            Circle(SKETCH_1_R_3, mode=Mode.SUBTRACT)
        with Locations((18.271530739, 31.730512305)):
            Circle(SKETCH_1_R_3, mode=Mode.SUBTRACT)
    extrude(amount=EXTRUDE_2_DEPTH)

    # 圆角1
    fillet_1_edges = [part.edges().sort_by_distance(p)[0] for p in [
        (-60.962487977, -43.003506411, 1),
        (-60.962487977, -35.003506411, 1),
        (-60.962487977, -13.003506411, 1),
        (-60.962487977, -5.003506411, 1),
        (31.037512023, -5.003506411, 1),
        (31.037512023, -13.003506411, 1),
        (31.037512023, -35.003506411, 1),
        (31.037512023, -43.003506411, 1),
    ]]
    fillet(fillet_1_edges, radius=FILLET_1_R)


solid = part.part
